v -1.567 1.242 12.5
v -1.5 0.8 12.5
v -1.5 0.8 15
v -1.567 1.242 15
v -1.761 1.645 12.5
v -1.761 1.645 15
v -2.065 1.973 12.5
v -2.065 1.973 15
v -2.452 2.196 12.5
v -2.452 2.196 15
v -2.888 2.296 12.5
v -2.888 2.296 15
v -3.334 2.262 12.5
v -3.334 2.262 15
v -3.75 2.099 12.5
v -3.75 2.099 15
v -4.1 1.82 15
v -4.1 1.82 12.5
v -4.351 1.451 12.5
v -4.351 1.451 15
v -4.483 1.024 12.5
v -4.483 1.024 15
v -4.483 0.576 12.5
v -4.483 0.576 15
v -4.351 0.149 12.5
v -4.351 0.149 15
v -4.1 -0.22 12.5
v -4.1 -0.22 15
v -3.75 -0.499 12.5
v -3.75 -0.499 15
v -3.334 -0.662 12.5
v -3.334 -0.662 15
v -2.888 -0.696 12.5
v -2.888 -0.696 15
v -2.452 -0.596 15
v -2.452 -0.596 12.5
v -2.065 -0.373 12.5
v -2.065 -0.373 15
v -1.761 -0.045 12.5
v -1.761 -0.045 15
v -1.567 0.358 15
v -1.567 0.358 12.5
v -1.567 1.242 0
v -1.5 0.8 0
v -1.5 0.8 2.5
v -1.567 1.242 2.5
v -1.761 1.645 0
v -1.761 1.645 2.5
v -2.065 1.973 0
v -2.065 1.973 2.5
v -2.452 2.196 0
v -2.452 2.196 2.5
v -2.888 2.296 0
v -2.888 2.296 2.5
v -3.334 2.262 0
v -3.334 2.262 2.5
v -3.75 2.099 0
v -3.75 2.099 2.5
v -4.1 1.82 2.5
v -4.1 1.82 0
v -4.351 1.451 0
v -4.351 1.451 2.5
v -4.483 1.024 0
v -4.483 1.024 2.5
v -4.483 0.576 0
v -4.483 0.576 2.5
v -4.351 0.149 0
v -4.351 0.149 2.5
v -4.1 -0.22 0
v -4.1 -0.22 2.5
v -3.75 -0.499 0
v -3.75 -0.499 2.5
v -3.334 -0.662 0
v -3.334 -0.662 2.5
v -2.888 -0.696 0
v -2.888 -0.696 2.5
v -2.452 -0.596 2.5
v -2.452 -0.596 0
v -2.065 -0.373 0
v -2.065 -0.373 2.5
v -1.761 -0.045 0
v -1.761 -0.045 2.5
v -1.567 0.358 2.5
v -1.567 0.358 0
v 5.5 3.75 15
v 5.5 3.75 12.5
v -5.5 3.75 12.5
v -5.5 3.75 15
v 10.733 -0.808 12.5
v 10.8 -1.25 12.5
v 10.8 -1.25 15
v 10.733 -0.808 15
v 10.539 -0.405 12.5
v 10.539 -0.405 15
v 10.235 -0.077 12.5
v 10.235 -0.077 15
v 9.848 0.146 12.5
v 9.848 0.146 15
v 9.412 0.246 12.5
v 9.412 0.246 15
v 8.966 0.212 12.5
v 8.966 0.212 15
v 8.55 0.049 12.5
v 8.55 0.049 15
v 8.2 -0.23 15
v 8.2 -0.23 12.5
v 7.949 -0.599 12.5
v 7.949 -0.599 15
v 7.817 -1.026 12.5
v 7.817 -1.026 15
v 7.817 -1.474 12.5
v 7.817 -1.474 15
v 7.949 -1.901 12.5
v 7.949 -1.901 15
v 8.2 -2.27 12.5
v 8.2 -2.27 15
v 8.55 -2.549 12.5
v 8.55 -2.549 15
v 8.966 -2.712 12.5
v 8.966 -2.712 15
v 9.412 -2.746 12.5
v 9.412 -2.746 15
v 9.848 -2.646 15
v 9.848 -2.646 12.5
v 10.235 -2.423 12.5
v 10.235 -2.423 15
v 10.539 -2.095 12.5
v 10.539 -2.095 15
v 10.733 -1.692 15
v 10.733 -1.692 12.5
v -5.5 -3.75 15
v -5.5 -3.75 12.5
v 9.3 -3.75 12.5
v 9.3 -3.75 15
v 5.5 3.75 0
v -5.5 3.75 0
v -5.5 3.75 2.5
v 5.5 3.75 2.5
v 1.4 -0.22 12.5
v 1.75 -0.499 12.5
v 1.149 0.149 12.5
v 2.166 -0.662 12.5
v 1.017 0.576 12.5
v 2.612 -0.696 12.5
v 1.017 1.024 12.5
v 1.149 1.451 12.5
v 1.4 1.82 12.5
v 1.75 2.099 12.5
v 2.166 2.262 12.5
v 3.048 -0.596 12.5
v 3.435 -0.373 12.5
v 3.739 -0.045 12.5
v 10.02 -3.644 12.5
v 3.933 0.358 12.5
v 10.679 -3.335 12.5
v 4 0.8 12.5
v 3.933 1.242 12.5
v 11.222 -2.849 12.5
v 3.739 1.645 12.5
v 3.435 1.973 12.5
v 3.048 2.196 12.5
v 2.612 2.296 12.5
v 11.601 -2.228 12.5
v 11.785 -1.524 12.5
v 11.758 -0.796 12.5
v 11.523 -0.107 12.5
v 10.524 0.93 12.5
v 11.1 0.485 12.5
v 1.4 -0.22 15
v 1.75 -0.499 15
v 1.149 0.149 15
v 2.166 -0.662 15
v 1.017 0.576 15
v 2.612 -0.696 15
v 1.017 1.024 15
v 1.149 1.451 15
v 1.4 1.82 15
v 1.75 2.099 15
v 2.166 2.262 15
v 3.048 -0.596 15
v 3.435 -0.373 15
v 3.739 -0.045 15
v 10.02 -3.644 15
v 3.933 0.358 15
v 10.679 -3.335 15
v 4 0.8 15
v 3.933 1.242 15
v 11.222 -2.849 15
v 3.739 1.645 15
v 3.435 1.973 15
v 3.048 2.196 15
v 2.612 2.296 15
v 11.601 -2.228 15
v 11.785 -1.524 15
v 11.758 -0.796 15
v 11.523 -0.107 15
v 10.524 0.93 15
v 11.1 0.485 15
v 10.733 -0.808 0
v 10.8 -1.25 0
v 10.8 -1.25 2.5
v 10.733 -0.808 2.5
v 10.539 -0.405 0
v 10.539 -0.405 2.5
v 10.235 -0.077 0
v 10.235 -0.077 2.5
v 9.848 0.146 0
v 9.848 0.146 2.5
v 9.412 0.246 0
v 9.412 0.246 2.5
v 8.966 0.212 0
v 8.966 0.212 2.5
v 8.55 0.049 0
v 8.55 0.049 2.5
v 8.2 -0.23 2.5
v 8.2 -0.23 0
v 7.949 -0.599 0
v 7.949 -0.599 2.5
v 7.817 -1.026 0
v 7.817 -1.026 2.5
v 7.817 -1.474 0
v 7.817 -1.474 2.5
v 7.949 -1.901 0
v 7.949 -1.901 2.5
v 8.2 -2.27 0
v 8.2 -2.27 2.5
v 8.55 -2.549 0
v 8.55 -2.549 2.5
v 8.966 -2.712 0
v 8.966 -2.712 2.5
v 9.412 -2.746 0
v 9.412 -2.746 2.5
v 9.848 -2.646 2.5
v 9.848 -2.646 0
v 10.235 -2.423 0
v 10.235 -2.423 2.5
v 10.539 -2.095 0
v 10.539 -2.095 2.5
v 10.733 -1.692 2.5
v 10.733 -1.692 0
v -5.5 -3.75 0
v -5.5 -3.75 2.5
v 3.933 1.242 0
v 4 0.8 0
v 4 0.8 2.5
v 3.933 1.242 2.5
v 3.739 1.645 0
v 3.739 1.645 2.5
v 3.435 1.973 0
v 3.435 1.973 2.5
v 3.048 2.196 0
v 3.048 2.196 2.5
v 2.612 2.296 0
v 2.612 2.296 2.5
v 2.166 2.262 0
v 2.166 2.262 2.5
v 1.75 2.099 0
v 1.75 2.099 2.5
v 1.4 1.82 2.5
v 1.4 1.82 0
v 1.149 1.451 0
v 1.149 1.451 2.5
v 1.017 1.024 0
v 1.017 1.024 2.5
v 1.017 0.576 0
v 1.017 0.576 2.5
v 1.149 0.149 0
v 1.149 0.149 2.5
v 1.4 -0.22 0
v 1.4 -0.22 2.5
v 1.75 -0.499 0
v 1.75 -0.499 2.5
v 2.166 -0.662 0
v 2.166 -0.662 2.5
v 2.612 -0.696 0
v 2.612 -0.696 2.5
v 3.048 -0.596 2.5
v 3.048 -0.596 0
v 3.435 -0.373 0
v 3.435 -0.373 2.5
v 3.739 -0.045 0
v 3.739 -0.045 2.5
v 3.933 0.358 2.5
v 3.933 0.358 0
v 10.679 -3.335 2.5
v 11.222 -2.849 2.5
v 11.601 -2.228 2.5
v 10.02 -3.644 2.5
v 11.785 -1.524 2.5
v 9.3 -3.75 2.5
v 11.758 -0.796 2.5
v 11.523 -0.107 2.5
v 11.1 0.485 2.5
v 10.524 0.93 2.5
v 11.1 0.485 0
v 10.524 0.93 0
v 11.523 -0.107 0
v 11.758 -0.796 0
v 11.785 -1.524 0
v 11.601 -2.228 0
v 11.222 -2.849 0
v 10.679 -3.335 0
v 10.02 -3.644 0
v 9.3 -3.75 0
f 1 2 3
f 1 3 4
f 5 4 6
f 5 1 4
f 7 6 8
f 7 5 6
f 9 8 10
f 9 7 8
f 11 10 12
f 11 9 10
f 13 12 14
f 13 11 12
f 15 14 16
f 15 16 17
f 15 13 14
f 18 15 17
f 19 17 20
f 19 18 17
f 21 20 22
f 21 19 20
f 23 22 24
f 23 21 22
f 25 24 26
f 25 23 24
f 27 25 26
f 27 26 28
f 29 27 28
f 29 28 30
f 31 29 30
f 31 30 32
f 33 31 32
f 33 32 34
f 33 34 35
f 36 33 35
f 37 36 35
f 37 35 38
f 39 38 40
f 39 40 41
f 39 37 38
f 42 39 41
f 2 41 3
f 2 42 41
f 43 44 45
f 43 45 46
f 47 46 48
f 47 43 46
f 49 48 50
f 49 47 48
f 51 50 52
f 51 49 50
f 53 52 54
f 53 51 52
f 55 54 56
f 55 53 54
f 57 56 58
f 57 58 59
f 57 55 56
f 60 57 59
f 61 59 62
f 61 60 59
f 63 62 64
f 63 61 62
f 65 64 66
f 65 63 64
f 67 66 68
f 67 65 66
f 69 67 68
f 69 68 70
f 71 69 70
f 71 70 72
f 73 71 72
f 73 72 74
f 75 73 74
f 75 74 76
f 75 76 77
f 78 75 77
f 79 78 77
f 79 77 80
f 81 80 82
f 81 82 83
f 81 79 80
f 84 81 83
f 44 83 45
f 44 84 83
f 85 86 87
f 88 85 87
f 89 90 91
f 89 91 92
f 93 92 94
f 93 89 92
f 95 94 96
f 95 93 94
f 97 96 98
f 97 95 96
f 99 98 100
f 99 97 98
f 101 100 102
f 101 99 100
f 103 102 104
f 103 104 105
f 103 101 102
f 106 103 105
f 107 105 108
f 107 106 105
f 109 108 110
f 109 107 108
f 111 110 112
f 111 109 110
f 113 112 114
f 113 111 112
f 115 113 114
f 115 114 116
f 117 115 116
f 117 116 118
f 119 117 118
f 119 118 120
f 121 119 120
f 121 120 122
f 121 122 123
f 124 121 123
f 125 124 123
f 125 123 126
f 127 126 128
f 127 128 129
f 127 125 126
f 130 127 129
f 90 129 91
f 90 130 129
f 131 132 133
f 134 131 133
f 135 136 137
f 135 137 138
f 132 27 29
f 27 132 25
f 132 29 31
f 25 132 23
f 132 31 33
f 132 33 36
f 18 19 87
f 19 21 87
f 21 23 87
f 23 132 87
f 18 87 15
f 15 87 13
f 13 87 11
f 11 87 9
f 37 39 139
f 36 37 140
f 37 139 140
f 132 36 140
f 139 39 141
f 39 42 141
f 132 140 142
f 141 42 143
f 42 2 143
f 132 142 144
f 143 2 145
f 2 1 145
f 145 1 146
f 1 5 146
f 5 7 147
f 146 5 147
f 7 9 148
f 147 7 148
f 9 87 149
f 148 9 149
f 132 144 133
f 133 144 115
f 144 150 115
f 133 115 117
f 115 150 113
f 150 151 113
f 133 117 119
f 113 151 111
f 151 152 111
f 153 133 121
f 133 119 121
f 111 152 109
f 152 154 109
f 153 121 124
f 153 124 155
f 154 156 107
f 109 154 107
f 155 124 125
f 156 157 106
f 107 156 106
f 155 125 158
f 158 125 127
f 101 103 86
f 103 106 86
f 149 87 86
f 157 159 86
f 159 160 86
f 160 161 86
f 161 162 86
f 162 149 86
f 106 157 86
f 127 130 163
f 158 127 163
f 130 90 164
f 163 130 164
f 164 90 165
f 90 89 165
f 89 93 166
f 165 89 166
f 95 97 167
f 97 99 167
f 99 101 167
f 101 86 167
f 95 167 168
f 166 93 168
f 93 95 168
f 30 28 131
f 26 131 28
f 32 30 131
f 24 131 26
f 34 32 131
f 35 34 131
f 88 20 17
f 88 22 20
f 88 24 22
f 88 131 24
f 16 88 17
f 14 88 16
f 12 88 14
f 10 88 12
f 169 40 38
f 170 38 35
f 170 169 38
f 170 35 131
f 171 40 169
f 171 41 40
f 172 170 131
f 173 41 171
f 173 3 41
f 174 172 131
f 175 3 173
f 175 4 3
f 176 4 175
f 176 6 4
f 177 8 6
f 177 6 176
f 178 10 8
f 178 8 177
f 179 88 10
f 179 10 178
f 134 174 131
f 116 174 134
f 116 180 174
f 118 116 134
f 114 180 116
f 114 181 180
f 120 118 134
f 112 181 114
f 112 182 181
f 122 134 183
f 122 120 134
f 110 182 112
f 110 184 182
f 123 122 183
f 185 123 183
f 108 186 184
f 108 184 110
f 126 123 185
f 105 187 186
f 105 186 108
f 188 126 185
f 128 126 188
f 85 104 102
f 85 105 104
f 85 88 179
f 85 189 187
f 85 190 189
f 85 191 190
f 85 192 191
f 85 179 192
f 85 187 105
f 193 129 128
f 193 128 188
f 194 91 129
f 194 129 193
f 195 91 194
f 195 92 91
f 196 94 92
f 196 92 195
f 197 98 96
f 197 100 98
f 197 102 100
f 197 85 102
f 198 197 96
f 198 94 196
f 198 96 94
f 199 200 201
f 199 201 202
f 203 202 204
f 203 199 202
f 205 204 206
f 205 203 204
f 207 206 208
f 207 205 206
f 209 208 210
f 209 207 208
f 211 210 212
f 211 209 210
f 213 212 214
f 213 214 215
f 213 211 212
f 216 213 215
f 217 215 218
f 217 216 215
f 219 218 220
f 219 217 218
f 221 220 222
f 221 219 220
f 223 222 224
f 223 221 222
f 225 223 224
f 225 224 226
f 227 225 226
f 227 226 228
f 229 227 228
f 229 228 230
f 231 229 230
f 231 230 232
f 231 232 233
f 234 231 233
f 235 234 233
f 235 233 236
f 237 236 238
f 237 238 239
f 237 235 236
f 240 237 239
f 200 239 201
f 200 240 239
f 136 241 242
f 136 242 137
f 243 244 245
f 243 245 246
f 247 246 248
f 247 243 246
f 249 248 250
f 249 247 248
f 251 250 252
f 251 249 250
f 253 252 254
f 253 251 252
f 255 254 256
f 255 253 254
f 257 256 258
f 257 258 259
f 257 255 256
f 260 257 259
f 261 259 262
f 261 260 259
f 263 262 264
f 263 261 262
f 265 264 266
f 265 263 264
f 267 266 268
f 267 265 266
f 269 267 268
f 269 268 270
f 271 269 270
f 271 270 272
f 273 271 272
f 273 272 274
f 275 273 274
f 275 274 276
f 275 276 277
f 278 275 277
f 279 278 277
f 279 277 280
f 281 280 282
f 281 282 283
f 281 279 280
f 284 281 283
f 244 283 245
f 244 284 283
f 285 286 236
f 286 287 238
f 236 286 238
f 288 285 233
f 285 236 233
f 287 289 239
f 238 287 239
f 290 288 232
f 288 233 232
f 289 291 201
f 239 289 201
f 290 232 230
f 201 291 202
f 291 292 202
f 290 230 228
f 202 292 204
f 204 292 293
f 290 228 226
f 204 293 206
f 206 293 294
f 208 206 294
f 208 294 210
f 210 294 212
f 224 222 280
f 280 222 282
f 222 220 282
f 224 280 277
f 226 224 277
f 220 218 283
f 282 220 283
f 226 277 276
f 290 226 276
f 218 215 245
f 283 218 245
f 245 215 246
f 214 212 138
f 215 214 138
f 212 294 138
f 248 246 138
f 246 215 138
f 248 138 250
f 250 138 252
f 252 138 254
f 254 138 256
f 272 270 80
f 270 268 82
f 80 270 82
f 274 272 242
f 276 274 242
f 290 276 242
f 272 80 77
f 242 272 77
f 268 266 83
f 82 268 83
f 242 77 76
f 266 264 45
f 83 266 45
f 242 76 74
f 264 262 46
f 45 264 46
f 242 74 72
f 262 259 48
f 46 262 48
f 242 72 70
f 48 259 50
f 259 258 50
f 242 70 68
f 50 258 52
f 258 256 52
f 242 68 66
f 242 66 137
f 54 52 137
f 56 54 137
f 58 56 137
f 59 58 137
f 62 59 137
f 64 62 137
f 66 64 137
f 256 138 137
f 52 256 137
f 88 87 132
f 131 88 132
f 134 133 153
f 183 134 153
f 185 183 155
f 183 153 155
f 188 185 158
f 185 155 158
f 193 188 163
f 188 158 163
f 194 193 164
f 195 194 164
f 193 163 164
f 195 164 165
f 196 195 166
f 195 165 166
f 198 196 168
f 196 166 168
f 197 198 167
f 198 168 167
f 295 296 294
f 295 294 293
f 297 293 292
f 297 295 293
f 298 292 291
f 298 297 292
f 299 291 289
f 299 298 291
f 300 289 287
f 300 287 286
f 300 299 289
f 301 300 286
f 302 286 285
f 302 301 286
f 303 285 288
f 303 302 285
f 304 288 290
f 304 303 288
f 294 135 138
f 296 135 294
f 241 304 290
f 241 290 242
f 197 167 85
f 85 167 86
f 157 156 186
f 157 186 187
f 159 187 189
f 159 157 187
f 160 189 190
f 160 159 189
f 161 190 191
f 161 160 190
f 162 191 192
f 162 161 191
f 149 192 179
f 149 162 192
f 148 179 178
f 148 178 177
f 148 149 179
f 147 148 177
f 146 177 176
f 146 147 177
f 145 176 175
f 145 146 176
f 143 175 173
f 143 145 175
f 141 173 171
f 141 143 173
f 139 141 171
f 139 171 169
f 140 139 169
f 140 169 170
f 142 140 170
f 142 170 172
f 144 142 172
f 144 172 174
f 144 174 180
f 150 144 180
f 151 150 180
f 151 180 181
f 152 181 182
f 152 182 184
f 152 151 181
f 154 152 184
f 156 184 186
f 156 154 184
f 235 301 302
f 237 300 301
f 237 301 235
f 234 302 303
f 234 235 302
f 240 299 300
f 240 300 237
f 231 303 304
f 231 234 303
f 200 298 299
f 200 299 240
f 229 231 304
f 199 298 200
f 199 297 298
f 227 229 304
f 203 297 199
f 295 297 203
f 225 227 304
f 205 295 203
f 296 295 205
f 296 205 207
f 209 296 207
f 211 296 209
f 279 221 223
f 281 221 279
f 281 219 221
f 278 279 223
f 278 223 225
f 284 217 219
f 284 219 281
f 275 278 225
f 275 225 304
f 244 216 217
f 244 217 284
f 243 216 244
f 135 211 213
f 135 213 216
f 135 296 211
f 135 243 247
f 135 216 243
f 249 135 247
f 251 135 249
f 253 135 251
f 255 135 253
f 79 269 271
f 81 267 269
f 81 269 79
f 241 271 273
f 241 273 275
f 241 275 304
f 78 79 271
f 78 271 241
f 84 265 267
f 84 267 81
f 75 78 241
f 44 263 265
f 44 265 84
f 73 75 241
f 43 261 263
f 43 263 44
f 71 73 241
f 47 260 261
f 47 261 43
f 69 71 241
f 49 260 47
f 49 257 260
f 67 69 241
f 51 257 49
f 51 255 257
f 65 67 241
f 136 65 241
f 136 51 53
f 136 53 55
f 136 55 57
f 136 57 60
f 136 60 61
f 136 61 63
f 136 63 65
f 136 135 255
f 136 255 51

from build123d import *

# Parameters (mm, degrees)
SKETCH_2_R      = 1.5
EXTRUDE_1_DEPTH = 2.5
EXTRUDE_START   = 10
SKETCH_3_R      = 1.5
EXTRUDE_2_DEPTH = 2.5


with BuildPart() as part:
    # 草图2 → 凸台-拉伸1 (new body)
    with BuildSketch(Plane.XY):
        with BuildLine():
            Line((5.5, 3.75), (10.523718398, 0.930025982))
            ThreePointArc((10.523718398, 0.930025982), (11.718684038, -1.882429856), (9.3, -3.75))
            Line((9.3, -3.75), (5.5, -3.75))
            Line((5.5, -3.75), (-5.5, -3.75))
            Line((-5.5, -3.75), (-5.5, 3.75))
            Line((-5.5, 3.75), (5.5, 3.75))
        make_face()
        with Locations((9.3, -1.25)):
            Circle(SKETCH_2_R, mode=Mode.SUBTRACT)
        with Locations((-3, 0.8)):
            Circle(SKETCH_2_R, mode=Mode.SUBTRACT)
        with Locations((2.5, 0.8)):
            Circle(SKETCH_2_R, mode=Mode.SUBTRACT)
    extrude(amount=EXTRUDE_1_DEPTH)


with BuildPart() as body_2:
    # 草图3 → 凸台-拉伸2 (new body)
    with BuildSketch(Plane.XY.offset(2.5).offset(EXTRUDE_START)):
        with BuildLine():
            Line((-5.5, -3.75), (9.3, -3.75))
            ThreePointArc((9.3, -3.75), (11.718684038, -1.882429856), (10.523718398, 0.930025982))
            Line((10.523718398, 0.930025982), (5.5, 3.75))
            Line((5.5, 3.75), (-5.5, 3.75))
            Line((-5.5, 3.75), (-5.5, -3.75))
        make_face()
        with Locations((9.3, -1.25)):
            Circle(SKETCH_3_R, mode=Mode.SUBTRACT)
        with Locations((2.5, 0.8)):
            Circle(SKETCH_3_R, mode=Mode.SUBTRACT)
        with Locations((-3, 0.8)):
            Circle(SKETCH_3_R, mode=Mode.SUBTRACT)
    extrude(amount=EXTRUDE_2_DEPTH)


solid = Compound([part.part, body_2.part])
